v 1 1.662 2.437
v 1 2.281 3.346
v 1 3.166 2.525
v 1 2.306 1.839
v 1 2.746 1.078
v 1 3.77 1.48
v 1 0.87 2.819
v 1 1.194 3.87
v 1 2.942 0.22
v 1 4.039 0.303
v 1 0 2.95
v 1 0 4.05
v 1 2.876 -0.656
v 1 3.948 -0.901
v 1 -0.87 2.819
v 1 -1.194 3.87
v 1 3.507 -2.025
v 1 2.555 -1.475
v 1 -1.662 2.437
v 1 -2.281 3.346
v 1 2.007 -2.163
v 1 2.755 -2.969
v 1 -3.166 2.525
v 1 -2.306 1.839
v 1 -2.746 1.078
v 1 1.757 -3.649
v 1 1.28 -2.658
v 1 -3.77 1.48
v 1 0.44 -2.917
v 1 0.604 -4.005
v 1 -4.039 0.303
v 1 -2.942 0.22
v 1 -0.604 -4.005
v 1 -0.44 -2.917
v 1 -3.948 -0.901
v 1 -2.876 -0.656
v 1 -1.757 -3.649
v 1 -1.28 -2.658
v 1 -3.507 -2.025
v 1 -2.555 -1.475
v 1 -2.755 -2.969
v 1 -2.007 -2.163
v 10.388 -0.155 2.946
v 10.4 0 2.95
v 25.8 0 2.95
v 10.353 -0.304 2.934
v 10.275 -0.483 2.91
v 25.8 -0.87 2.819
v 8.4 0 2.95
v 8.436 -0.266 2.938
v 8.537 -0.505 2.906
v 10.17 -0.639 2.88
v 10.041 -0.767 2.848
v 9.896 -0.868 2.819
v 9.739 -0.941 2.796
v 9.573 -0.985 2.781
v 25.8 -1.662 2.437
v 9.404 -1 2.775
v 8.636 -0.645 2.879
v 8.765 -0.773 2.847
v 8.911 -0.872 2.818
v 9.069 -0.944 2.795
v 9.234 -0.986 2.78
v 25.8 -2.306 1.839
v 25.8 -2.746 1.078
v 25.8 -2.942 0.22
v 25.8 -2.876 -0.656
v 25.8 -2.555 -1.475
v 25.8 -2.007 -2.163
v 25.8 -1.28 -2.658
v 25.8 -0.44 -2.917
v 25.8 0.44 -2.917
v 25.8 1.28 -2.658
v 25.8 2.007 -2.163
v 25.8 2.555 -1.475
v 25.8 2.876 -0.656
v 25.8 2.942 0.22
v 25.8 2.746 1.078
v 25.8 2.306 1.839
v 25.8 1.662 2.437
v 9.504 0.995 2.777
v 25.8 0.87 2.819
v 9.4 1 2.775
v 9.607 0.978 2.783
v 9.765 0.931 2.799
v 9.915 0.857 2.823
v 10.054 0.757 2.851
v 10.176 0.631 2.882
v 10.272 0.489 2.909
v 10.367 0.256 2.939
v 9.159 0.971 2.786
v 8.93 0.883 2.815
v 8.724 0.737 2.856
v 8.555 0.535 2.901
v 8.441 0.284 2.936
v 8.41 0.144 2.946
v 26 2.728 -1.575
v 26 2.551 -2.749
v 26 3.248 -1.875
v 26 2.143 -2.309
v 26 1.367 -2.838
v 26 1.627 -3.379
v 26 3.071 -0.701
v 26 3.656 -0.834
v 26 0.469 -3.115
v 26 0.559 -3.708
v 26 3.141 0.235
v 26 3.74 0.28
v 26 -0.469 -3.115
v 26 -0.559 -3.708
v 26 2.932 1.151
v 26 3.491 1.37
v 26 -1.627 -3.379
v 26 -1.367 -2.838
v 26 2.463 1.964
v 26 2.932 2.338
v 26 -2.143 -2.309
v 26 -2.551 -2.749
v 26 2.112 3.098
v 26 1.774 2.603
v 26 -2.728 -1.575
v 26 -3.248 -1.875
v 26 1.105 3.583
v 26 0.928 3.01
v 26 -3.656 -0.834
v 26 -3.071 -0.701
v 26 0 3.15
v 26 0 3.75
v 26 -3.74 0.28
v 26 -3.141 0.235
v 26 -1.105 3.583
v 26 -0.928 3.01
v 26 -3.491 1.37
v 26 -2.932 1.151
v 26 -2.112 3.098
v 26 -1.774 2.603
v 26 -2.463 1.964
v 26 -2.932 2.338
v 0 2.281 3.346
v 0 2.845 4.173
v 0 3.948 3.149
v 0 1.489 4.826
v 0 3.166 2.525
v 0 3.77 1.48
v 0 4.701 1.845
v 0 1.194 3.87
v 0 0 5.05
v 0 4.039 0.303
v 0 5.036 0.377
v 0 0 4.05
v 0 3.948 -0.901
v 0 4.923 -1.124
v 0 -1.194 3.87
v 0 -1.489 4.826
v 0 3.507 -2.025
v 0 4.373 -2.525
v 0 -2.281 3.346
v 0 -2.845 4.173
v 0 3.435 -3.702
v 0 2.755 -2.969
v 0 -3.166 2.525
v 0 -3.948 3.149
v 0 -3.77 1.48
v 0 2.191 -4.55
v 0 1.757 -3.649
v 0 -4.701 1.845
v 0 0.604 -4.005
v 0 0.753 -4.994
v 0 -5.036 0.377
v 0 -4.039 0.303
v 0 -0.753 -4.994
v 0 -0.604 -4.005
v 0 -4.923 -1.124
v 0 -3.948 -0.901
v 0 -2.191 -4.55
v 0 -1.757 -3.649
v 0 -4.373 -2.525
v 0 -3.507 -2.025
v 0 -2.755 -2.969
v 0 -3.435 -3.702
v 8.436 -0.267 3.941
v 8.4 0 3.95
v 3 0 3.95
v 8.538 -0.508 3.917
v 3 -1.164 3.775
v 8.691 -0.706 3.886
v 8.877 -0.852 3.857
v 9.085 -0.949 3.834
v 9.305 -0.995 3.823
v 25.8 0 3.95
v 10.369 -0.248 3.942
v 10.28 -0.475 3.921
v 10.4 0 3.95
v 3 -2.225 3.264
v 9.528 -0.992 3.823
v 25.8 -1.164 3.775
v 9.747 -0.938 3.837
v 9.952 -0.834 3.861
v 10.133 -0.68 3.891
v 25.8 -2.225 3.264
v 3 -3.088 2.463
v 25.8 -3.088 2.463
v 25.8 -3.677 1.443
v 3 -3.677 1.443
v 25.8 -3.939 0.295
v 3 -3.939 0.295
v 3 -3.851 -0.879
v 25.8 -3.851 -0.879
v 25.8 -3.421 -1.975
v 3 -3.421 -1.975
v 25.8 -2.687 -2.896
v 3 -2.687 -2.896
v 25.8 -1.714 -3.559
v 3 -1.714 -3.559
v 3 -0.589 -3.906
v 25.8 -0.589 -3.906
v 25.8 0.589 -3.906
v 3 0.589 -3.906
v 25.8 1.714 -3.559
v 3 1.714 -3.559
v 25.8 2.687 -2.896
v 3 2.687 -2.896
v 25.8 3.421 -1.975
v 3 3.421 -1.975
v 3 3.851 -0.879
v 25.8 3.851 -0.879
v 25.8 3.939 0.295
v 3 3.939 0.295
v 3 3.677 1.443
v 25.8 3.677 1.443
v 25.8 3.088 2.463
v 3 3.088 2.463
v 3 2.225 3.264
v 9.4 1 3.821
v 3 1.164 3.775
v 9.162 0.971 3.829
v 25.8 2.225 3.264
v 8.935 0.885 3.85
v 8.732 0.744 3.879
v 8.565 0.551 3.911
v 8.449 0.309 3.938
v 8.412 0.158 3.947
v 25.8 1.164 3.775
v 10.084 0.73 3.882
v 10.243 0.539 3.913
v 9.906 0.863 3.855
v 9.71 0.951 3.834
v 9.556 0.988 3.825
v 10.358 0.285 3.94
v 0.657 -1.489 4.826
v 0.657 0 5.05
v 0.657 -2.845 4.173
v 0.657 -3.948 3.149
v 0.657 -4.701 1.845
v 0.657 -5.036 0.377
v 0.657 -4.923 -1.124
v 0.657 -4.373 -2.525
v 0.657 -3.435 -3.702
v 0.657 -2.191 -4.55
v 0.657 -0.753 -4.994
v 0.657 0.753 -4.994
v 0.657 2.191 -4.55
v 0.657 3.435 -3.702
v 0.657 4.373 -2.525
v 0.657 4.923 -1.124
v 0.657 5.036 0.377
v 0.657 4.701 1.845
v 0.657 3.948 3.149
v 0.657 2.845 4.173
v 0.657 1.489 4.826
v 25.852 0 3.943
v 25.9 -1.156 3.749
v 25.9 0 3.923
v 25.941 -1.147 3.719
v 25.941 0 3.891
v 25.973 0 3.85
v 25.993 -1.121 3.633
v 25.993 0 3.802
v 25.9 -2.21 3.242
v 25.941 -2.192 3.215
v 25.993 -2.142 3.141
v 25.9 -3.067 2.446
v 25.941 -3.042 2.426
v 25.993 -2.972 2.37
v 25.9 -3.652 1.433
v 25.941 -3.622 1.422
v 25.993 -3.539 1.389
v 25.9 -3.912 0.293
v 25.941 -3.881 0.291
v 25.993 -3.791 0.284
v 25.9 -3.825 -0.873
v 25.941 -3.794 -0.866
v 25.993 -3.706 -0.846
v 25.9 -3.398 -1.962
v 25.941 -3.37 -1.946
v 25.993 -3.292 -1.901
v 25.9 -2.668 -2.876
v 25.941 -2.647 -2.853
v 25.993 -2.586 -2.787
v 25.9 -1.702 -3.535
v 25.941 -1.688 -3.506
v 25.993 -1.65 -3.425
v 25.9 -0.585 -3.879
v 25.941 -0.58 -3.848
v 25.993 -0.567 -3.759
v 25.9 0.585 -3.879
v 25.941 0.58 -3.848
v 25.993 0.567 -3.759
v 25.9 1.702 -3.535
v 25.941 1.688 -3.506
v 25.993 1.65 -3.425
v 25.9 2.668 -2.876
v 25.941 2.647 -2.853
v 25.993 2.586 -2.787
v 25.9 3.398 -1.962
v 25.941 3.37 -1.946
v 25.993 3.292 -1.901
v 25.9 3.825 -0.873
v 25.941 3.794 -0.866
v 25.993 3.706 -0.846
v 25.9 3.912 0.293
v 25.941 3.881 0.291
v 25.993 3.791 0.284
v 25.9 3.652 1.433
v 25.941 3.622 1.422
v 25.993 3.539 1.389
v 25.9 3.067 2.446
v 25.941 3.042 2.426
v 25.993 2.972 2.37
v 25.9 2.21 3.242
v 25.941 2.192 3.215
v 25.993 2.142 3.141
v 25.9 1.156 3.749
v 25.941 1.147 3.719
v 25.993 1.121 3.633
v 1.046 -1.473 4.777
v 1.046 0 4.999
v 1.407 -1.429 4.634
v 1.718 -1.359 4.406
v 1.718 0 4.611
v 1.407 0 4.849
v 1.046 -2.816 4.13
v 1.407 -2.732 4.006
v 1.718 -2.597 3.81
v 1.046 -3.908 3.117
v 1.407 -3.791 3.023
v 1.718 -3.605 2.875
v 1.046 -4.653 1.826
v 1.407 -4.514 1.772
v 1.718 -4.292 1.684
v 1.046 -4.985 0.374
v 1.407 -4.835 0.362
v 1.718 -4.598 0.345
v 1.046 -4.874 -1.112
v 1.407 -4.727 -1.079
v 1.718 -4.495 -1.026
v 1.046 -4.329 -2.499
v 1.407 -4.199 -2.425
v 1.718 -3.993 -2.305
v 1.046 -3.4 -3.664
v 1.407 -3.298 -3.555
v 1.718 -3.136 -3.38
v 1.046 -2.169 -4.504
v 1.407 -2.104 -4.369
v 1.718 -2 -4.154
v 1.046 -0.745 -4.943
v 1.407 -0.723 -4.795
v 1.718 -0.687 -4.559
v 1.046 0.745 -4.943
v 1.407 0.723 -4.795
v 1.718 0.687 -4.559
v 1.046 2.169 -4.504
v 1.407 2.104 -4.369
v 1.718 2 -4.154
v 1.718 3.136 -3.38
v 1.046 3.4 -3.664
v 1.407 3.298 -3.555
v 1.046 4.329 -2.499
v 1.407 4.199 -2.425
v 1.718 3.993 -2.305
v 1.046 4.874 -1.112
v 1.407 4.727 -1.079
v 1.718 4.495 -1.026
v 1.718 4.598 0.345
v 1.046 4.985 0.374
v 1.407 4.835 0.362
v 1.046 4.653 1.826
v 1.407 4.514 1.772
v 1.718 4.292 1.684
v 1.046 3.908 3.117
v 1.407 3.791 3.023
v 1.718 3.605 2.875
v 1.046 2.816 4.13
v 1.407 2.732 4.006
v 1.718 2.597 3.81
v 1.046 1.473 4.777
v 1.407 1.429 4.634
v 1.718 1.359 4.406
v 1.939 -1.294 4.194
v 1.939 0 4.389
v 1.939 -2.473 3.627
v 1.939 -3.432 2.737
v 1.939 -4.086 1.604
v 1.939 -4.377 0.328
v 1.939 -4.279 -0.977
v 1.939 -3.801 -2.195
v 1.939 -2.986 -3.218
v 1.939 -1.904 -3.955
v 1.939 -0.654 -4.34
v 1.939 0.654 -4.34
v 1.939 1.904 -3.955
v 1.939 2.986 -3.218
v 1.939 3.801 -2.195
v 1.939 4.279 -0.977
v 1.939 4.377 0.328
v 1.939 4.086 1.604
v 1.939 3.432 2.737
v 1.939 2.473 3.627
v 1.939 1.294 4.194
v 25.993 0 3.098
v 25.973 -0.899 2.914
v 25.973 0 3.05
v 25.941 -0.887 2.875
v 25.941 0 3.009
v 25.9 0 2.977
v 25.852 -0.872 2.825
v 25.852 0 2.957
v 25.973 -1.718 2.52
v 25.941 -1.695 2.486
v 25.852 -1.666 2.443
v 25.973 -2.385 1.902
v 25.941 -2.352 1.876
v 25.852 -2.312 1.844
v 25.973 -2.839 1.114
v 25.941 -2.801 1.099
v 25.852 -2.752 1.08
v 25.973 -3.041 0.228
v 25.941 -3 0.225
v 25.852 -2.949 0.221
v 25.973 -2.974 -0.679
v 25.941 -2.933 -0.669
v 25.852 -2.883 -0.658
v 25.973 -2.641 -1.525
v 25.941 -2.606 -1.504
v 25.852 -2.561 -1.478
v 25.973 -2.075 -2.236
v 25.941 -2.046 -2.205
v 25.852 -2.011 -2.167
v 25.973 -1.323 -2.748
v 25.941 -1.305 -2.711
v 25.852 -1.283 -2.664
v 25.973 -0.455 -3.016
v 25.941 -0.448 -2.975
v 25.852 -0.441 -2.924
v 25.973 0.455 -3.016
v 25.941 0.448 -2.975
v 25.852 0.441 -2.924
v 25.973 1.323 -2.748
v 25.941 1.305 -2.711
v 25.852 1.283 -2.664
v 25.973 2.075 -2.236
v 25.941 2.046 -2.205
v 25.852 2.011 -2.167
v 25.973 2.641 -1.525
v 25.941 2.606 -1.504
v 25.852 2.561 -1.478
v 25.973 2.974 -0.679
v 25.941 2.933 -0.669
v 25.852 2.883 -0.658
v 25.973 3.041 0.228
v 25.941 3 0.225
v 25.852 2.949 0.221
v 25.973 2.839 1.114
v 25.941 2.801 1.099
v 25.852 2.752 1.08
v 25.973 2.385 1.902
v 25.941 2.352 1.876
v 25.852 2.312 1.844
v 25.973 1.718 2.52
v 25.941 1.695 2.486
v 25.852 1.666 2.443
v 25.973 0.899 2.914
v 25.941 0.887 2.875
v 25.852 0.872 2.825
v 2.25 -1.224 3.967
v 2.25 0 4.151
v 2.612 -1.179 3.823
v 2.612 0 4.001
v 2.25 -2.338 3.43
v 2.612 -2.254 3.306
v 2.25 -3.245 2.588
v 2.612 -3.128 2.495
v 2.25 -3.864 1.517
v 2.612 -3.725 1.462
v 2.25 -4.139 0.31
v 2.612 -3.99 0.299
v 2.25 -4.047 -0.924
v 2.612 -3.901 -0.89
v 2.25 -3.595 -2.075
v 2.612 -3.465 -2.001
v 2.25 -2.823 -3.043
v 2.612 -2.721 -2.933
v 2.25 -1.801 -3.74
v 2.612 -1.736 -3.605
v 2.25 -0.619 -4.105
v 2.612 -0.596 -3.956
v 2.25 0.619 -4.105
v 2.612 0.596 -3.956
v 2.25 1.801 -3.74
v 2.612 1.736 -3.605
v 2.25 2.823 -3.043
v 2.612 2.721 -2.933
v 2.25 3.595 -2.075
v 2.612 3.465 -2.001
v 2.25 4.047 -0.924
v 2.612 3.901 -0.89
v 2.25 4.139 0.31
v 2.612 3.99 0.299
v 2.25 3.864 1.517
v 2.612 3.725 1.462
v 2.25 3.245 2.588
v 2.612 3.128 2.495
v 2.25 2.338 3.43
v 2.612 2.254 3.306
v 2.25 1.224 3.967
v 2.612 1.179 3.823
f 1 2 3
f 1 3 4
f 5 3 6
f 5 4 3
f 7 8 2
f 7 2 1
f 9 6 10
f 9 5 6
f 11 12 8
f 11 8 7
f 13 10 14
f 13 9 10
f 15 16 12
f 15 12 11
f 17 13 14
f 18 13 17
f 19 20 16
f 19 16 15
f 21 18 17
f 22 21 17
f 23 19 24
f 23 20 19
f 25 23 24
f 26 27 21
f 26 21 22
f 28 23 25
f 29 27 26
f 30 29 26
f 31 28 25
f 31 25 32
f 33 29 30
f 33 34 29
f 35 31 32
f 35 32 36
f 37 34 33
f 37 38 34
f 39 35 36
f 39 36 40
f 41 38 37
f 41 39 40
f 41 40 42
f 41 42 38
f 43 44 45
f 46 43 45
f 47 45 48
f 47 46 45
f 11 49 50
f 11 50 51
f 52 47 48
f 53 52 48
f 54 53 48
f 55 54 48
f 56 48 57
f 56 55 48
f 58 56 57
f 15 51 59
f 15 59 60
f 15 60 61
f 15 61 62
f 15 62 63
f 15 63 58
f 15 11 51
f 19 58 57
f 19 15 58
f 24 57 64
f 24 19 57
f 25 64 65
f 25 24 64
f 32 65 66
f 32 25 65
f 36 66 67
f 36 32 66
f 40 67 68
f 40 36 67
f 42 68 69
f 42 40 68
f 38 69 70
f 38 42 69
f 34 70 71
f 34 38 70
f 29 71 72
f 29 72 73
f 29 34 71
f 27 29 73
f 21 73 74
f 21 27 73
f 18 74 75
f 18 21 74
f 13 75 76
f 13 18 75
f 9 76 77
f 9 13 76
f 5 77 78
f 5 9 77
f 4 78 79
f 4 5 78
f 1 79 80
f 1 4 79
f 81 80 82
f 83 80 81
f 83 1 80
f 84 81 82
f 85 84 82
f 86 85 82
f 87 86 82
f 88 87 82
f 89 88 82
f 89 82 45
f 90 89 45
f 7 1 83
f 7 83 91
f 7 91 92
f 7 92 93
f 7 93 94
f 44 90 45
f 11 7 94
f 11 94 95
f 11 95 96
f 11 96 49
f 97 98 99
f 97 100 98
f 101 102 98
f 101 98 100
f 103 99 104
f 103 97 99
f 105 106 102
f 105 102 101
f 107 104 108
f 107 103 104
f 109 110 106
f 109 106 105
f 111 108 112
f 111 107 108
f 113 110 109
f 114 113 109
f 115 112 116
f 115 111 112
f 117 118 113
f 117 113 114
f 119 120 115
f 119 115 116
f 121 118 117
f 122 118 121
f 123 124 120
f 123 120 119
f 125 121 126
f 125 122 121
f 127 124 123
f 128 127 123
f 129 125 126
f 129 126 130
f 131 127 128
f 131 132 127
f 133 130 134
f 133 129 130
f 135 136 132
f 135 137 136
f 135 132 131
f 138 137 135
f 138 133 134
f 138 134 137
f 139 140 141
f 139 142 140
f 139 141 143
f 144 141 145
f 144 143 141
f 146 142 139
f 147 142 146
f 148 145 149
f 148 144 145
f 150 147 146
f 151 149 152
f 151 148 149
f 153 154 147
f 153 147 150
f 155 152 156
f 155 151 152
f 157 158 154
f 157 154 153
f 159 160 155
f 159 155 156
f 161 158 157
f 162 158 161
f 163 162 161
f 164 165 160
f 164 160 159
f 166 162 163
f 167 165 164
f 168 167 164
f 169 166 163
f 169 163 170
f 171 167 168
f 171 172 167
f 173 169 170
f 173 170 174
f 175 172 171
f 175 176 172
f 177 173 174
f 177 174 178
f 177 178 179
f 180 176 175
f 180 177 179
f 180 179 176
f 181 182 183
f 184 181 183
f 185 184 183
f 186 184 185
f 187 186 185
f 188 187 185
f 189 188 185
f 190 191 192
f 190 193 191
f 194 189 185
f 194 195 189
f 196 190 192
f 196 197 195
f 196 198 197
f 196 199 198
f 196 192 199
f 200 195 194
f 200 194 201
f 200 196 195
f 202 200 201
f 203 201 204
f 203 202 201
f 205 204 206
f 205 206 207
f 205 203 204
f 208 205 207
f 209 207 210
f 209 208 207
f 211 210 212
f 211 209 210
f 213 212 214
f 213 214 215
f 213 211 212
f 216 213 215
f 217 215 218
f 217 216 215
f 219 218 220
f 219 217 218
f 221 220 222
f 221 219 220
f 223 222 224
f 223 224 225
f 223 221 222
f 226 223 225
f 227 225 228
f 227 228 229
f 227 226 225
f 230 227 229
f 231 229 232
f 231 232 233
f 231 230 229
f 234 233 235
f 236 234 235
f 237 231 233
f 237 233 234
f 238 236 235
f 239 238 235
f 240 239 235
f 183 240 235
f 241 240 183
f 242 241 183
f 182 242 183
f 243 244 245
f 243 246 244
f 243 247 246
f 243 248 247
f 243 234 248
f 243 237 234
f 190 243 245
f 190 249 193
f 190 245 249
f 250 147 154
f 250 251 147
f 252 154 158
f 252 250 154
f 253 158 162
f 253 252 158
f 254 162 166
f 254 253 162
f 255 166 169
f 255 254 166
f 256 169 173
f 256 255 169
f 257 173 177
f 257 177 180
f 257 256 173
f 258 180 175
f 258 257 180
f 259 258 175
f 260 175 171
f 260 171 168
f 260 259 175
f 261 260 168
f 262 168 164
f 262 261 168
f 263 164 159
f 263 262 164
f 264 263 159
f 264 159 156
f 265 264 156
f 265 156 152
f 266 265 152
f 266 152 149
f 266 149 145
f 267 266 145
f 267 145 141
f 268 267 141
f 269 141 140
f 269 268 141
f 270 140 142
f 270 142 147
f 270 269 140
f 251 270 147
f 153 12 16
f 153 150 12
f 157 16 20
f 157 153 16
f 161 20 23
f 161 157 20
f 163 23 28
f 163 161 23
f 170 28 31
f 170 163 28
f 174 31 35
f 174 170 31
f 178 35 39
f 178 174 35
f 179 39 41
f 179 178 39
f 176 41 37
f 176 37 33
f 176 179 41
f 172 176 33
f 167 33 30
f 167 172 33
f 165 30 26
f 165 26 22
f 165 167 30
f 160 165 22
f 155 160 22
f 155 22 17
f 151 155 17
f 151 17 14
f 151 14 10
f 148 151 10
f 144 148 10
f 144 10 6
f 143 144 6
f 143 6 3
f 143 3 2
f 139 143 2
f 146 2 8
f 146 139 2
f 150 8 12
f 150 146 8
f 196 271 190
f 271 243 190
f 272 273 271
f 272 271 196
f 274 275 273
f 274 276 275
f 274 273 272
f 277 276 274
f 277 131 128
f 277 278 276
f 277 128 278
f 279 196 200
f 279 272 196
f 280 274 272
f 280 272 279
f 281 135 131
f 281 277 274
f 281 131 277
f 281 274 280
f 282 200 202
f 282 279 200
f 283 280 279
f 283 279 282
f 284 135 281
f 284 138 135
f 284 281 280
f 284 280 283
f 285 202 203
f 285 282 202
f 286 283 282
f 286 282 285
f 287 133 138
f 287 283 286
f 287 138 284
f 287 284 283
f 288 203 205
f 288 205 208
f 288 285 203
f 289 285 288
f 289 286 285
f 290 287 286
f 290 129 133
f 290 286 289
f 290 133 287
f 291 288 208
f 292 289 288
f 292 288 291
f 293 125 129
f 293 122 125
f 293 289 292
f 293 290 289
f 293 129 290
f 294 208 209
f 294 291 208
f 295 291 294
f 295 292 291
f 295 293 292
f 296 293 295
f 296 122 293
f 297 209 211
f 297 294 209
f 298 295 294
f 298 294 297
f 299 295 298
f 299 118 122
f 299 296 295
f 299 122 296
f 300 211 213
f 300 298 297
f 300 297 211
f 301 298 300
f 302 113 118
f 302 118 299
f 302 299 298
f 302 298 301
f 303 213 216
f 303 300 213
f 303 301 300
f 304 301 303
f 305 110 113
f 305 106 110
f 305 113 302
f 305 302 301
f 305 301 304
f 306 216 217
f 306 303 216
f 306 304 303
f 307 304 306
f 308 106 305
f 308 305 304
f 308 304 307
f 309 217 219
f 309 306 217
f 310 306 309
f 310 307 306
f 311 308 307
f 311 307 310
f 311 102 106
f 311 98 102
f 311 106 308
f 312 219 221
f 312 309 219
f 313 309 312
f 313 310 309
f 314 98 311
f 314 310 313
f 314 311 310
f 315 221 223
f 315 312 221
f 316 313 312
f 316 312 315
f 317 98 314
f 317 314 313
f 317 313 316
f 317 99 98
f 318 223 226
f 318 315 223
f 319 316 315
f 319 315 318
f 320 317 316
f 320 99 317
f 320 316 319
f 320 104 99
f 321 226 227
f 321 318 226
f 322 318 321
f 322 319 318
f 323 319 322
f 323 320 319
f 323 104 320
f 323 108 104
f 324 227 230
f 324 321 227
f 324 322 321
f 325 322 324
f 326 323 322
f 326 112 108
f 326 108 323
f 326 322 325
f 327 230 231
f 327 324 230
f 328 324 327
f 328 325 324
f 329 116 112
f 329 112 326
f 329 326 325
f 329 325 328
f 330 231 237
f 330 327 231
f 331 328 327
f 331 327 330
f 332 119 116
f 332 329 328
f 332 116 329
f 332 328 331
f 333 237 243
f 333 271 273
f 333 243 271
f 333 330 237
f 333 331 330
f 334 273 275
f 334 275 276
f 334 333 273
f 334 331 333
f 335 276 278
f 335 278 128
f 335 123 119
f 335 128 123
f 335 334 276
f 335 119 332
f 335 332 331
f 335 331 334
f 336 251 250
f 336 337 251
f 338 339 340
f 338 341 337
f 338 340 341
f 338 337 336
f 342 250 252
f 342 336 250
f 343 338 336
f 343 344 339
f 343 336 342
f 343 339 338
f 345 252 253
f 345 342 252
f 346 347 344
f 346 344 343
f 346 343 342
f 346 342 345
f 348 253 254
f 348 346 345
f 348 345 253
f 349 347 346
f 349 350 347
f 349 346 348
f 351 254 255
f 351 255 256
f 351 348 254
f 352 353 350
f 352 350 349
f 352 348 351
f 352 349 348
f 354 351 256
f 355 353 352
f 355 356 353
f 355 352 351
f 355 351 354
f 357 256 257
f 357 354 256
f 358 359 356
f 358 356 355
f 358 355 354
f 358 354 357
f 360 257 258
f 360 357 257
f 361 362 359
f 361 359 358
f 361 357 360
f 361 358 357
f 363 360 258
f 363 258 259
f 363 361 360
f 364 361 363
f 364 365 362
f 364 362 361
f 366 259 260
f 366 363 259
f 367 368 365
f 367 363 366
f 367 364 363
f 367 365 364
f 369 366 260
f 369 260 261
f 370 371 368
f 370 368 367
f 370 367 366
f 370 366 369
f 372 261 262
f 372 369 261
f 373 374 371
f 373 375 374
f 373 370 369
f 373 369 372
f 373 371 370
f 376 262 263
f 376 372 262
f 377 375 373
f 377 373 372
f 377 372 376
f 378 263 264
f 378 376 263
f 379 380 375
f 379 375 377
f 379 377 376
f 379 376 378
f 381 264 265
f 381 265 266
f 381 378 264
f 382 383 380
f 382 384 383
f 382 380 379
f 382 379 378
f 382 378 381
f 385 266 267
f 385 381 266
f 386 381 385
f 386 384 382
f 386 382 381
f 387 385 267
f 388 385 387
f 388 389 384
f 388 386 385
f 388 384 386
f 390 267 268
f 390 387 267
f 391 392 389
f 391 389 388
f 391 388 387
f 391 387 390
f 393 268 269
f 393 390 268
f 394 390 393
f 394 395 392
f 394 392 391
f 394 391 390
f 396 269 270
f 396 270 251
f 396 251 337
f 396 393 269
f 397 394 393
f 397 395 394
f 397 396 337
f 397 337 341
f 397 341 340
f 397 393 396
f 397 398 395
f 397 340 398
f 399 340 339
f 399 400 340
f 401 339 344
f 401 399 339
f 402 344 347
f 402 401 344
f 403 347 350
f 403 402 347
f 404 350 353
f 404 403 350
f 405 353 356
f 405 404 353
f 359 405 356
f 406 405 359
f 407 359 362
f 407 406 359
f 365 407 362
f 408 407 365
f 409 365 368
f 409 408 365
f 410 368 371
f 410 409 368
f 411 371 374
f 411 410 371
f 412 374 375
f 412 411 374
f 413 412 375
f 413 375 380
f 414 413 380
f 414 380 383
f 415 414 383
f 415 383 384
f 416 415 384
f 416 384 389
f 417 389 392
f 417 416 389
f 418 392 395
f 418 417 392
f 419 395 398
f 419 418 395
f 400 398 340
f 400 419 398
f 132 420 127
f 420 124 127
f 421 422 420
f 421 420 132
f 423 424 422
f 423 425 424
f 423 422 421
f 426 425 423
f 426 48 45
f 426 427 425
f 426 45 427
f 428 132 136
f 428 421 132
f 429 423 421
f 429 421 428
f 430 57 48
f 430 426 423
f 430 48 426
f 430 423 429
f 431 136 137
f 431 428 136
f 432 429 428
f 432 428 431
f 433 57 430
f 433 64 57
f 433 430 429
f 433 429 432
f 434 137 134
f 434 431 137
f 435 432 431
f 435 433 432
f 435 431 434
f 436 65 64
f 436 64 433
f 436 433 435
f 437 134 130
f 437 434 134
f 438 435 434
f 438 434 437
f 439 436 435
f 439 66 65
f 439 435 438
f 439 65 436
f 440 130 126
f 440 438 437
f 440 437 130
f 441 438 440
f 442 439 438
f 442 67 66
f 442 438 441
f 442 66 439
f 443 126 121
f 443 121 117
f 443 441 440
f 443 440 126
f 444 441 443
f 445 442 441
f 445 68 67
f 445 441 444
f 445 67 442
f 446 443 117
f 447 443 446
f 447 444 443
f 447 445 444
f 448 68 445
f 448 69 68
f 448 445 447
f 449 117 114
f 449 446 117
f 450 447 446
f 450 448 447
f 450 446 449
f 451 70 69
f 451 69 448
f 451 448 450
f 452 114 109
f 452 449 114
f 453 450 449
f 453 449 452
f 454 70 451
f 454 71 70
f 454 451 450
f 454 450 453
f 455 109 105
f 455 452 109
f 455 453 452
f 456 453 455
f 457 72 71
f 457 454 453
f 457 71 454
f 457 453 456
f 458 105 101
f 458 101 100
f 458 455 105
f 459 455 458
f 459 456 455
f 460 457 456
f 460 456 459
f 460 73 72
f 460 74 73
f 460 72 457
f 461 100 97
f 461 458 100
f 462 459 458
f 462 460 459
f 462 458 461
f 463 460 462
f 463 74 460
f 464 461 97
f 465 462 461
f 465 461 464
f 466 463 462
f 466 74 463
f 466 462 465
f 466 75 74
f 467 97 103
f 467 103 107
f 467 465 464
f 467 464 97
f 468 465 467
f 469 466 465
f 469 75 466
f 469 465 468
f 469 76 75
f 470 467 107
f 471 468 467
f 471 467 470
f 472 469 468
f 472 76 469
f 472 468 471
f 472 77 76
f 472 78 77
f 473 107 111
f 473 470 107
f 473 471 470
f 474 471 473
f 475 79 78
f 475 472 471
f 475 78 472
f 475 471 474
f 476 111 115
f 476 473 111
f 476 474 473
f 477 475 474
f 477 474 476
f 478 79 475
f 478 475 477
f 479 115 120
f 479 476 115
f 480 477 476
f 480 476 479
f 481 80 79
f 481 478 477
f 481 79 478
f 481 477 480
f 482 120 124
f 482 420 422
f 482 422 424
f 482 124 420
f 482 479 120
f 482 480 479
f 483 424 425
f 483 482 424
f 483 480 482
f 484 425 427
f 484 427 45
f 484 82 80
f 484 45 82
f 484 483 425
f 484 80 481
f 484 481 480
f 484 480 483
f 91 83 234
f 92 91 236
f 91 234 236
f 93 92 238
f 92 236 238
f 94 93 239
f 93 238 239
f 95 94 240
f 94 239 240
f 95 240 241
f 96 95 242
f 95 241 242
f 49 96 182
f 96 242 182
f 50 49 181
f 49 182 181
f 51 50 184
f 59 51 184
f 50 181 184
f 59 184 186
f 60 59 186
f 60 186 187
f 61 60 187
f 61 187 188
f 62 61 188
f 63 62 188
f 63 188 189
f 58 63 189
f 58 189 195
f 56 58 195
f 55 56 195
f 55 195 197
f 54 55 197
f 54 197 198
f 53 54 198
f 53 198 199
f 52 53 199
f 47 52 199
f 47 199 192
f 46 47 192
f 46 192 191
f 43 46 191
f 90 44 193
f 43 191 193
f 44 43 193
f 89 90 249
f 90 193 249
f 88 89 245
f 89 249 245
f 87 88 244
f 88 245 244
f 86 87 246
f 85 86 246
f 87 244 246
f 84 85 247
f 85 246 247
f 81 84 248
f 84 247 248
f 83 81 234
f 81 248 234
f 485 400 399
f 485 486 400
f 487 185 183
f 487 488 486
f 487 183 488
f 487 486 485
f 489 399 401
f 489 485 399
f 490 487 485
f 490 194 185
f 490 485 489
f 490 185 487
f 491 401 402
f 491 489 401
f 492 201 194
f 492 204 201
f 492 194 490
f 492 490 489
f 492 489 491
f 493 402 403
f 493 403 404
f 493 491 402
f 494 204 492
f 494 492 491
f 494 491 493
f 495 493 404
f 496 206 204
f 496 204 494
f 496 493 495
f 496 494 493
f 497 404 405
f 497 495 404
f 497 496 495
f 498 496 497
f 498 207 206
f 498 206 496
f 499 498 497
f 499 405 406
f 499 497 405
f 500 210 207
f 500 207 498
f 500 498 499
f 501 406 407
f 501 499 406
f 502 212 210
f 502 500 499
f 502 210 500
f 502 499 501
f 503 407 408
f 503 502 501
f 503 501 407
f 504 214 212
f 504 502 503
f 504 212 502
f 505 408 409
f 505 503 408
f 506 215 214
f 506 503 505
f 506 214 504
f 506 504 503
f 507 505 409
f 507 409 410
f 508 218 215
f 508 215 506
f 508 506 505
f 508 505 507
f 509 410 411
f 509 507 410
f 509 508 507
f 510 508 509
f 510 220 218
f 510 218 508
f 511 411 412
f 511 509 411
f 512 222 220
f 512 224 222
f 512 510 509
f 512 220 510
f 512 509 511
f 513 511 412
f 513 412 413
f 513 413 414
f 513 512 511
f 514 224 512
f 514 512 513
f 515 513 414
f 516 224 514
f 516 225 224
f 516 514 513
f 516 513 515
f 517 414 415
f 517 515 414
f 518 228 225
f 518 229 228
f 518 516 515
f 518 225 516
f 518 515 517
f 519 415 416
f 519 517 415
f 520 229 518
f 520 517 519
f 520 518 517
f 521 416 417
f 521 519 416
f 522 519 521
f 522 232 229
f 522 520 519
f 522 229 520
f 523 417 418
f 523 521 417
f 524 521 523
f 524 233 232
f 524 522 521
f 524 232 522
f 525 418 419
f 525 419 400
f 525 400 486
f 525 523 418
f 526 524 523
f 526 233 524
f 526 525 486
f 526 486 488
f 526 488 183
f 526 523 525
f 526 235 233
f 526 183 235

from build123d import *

# Parameters (mm, degrees)
ESQUISSE4_W = 1
ESQUISSE4_H = 5.05


with BuildPart() as part:
    # Esquisse1 → Révolution1 (revolve)
    with BuildSketch(Plane.XY, mode=Mode.PRIVATE) as r_volution1_sk:
        with BuildLine():
            Line((0, 4.05), (0, 5.05))
            Line((0, 5.05), (0.657359313, 5.05))
            ThreePointArc((0.657359313, 5.05), (1.231384461, 4.935819299), (1.718019485, 4.610660172))
            Line((1.718019485, 4.610660172), (1.939339828, 4.389339828))
            ThreePointArc((1.939339828, 4.389339828), (2.425974851, 4.064180701), (3, 3.95))
            Line((3, 3.95), (25.8, 3.95))
            ThreePointArc((25.8, 3.95), (25.941421356, 3.891421356), (26, 3.75))
            Line((26, 3.75), (26, 3.15))
            ThreePointArc((26, 3.15), (25.941421356, 3.008578644), (25.8, 2.95))
            Line((25.8, 2.95), (1, 2.95))
            Line((1, 2.95), (1, 4.05))
            Line((1, 4.05), (0, 4.05))
        make_face()
    revolve(r_volution1_sk.sketch.rotate(Axis((-11.300588411, 0, 0), (1, 0, 0)), 90), axis=Axis((-11.300588411, 0, 0), (1, 0, 0)))

    # Esquisse4 → Dégagement M21 (revolve, cut)
    with BuildSketch(Plane.YZ.offset(9.4)):
        with Locations((0.5, 2.525)):
            Rectangle(ESQUISSE4_W, ESQUISSE4_H)
    revolve(axis=Axis((9.4, 0, -6.35), (0, 0, 1)), mode=Mode.SUBTRACT)


solid = part.part
